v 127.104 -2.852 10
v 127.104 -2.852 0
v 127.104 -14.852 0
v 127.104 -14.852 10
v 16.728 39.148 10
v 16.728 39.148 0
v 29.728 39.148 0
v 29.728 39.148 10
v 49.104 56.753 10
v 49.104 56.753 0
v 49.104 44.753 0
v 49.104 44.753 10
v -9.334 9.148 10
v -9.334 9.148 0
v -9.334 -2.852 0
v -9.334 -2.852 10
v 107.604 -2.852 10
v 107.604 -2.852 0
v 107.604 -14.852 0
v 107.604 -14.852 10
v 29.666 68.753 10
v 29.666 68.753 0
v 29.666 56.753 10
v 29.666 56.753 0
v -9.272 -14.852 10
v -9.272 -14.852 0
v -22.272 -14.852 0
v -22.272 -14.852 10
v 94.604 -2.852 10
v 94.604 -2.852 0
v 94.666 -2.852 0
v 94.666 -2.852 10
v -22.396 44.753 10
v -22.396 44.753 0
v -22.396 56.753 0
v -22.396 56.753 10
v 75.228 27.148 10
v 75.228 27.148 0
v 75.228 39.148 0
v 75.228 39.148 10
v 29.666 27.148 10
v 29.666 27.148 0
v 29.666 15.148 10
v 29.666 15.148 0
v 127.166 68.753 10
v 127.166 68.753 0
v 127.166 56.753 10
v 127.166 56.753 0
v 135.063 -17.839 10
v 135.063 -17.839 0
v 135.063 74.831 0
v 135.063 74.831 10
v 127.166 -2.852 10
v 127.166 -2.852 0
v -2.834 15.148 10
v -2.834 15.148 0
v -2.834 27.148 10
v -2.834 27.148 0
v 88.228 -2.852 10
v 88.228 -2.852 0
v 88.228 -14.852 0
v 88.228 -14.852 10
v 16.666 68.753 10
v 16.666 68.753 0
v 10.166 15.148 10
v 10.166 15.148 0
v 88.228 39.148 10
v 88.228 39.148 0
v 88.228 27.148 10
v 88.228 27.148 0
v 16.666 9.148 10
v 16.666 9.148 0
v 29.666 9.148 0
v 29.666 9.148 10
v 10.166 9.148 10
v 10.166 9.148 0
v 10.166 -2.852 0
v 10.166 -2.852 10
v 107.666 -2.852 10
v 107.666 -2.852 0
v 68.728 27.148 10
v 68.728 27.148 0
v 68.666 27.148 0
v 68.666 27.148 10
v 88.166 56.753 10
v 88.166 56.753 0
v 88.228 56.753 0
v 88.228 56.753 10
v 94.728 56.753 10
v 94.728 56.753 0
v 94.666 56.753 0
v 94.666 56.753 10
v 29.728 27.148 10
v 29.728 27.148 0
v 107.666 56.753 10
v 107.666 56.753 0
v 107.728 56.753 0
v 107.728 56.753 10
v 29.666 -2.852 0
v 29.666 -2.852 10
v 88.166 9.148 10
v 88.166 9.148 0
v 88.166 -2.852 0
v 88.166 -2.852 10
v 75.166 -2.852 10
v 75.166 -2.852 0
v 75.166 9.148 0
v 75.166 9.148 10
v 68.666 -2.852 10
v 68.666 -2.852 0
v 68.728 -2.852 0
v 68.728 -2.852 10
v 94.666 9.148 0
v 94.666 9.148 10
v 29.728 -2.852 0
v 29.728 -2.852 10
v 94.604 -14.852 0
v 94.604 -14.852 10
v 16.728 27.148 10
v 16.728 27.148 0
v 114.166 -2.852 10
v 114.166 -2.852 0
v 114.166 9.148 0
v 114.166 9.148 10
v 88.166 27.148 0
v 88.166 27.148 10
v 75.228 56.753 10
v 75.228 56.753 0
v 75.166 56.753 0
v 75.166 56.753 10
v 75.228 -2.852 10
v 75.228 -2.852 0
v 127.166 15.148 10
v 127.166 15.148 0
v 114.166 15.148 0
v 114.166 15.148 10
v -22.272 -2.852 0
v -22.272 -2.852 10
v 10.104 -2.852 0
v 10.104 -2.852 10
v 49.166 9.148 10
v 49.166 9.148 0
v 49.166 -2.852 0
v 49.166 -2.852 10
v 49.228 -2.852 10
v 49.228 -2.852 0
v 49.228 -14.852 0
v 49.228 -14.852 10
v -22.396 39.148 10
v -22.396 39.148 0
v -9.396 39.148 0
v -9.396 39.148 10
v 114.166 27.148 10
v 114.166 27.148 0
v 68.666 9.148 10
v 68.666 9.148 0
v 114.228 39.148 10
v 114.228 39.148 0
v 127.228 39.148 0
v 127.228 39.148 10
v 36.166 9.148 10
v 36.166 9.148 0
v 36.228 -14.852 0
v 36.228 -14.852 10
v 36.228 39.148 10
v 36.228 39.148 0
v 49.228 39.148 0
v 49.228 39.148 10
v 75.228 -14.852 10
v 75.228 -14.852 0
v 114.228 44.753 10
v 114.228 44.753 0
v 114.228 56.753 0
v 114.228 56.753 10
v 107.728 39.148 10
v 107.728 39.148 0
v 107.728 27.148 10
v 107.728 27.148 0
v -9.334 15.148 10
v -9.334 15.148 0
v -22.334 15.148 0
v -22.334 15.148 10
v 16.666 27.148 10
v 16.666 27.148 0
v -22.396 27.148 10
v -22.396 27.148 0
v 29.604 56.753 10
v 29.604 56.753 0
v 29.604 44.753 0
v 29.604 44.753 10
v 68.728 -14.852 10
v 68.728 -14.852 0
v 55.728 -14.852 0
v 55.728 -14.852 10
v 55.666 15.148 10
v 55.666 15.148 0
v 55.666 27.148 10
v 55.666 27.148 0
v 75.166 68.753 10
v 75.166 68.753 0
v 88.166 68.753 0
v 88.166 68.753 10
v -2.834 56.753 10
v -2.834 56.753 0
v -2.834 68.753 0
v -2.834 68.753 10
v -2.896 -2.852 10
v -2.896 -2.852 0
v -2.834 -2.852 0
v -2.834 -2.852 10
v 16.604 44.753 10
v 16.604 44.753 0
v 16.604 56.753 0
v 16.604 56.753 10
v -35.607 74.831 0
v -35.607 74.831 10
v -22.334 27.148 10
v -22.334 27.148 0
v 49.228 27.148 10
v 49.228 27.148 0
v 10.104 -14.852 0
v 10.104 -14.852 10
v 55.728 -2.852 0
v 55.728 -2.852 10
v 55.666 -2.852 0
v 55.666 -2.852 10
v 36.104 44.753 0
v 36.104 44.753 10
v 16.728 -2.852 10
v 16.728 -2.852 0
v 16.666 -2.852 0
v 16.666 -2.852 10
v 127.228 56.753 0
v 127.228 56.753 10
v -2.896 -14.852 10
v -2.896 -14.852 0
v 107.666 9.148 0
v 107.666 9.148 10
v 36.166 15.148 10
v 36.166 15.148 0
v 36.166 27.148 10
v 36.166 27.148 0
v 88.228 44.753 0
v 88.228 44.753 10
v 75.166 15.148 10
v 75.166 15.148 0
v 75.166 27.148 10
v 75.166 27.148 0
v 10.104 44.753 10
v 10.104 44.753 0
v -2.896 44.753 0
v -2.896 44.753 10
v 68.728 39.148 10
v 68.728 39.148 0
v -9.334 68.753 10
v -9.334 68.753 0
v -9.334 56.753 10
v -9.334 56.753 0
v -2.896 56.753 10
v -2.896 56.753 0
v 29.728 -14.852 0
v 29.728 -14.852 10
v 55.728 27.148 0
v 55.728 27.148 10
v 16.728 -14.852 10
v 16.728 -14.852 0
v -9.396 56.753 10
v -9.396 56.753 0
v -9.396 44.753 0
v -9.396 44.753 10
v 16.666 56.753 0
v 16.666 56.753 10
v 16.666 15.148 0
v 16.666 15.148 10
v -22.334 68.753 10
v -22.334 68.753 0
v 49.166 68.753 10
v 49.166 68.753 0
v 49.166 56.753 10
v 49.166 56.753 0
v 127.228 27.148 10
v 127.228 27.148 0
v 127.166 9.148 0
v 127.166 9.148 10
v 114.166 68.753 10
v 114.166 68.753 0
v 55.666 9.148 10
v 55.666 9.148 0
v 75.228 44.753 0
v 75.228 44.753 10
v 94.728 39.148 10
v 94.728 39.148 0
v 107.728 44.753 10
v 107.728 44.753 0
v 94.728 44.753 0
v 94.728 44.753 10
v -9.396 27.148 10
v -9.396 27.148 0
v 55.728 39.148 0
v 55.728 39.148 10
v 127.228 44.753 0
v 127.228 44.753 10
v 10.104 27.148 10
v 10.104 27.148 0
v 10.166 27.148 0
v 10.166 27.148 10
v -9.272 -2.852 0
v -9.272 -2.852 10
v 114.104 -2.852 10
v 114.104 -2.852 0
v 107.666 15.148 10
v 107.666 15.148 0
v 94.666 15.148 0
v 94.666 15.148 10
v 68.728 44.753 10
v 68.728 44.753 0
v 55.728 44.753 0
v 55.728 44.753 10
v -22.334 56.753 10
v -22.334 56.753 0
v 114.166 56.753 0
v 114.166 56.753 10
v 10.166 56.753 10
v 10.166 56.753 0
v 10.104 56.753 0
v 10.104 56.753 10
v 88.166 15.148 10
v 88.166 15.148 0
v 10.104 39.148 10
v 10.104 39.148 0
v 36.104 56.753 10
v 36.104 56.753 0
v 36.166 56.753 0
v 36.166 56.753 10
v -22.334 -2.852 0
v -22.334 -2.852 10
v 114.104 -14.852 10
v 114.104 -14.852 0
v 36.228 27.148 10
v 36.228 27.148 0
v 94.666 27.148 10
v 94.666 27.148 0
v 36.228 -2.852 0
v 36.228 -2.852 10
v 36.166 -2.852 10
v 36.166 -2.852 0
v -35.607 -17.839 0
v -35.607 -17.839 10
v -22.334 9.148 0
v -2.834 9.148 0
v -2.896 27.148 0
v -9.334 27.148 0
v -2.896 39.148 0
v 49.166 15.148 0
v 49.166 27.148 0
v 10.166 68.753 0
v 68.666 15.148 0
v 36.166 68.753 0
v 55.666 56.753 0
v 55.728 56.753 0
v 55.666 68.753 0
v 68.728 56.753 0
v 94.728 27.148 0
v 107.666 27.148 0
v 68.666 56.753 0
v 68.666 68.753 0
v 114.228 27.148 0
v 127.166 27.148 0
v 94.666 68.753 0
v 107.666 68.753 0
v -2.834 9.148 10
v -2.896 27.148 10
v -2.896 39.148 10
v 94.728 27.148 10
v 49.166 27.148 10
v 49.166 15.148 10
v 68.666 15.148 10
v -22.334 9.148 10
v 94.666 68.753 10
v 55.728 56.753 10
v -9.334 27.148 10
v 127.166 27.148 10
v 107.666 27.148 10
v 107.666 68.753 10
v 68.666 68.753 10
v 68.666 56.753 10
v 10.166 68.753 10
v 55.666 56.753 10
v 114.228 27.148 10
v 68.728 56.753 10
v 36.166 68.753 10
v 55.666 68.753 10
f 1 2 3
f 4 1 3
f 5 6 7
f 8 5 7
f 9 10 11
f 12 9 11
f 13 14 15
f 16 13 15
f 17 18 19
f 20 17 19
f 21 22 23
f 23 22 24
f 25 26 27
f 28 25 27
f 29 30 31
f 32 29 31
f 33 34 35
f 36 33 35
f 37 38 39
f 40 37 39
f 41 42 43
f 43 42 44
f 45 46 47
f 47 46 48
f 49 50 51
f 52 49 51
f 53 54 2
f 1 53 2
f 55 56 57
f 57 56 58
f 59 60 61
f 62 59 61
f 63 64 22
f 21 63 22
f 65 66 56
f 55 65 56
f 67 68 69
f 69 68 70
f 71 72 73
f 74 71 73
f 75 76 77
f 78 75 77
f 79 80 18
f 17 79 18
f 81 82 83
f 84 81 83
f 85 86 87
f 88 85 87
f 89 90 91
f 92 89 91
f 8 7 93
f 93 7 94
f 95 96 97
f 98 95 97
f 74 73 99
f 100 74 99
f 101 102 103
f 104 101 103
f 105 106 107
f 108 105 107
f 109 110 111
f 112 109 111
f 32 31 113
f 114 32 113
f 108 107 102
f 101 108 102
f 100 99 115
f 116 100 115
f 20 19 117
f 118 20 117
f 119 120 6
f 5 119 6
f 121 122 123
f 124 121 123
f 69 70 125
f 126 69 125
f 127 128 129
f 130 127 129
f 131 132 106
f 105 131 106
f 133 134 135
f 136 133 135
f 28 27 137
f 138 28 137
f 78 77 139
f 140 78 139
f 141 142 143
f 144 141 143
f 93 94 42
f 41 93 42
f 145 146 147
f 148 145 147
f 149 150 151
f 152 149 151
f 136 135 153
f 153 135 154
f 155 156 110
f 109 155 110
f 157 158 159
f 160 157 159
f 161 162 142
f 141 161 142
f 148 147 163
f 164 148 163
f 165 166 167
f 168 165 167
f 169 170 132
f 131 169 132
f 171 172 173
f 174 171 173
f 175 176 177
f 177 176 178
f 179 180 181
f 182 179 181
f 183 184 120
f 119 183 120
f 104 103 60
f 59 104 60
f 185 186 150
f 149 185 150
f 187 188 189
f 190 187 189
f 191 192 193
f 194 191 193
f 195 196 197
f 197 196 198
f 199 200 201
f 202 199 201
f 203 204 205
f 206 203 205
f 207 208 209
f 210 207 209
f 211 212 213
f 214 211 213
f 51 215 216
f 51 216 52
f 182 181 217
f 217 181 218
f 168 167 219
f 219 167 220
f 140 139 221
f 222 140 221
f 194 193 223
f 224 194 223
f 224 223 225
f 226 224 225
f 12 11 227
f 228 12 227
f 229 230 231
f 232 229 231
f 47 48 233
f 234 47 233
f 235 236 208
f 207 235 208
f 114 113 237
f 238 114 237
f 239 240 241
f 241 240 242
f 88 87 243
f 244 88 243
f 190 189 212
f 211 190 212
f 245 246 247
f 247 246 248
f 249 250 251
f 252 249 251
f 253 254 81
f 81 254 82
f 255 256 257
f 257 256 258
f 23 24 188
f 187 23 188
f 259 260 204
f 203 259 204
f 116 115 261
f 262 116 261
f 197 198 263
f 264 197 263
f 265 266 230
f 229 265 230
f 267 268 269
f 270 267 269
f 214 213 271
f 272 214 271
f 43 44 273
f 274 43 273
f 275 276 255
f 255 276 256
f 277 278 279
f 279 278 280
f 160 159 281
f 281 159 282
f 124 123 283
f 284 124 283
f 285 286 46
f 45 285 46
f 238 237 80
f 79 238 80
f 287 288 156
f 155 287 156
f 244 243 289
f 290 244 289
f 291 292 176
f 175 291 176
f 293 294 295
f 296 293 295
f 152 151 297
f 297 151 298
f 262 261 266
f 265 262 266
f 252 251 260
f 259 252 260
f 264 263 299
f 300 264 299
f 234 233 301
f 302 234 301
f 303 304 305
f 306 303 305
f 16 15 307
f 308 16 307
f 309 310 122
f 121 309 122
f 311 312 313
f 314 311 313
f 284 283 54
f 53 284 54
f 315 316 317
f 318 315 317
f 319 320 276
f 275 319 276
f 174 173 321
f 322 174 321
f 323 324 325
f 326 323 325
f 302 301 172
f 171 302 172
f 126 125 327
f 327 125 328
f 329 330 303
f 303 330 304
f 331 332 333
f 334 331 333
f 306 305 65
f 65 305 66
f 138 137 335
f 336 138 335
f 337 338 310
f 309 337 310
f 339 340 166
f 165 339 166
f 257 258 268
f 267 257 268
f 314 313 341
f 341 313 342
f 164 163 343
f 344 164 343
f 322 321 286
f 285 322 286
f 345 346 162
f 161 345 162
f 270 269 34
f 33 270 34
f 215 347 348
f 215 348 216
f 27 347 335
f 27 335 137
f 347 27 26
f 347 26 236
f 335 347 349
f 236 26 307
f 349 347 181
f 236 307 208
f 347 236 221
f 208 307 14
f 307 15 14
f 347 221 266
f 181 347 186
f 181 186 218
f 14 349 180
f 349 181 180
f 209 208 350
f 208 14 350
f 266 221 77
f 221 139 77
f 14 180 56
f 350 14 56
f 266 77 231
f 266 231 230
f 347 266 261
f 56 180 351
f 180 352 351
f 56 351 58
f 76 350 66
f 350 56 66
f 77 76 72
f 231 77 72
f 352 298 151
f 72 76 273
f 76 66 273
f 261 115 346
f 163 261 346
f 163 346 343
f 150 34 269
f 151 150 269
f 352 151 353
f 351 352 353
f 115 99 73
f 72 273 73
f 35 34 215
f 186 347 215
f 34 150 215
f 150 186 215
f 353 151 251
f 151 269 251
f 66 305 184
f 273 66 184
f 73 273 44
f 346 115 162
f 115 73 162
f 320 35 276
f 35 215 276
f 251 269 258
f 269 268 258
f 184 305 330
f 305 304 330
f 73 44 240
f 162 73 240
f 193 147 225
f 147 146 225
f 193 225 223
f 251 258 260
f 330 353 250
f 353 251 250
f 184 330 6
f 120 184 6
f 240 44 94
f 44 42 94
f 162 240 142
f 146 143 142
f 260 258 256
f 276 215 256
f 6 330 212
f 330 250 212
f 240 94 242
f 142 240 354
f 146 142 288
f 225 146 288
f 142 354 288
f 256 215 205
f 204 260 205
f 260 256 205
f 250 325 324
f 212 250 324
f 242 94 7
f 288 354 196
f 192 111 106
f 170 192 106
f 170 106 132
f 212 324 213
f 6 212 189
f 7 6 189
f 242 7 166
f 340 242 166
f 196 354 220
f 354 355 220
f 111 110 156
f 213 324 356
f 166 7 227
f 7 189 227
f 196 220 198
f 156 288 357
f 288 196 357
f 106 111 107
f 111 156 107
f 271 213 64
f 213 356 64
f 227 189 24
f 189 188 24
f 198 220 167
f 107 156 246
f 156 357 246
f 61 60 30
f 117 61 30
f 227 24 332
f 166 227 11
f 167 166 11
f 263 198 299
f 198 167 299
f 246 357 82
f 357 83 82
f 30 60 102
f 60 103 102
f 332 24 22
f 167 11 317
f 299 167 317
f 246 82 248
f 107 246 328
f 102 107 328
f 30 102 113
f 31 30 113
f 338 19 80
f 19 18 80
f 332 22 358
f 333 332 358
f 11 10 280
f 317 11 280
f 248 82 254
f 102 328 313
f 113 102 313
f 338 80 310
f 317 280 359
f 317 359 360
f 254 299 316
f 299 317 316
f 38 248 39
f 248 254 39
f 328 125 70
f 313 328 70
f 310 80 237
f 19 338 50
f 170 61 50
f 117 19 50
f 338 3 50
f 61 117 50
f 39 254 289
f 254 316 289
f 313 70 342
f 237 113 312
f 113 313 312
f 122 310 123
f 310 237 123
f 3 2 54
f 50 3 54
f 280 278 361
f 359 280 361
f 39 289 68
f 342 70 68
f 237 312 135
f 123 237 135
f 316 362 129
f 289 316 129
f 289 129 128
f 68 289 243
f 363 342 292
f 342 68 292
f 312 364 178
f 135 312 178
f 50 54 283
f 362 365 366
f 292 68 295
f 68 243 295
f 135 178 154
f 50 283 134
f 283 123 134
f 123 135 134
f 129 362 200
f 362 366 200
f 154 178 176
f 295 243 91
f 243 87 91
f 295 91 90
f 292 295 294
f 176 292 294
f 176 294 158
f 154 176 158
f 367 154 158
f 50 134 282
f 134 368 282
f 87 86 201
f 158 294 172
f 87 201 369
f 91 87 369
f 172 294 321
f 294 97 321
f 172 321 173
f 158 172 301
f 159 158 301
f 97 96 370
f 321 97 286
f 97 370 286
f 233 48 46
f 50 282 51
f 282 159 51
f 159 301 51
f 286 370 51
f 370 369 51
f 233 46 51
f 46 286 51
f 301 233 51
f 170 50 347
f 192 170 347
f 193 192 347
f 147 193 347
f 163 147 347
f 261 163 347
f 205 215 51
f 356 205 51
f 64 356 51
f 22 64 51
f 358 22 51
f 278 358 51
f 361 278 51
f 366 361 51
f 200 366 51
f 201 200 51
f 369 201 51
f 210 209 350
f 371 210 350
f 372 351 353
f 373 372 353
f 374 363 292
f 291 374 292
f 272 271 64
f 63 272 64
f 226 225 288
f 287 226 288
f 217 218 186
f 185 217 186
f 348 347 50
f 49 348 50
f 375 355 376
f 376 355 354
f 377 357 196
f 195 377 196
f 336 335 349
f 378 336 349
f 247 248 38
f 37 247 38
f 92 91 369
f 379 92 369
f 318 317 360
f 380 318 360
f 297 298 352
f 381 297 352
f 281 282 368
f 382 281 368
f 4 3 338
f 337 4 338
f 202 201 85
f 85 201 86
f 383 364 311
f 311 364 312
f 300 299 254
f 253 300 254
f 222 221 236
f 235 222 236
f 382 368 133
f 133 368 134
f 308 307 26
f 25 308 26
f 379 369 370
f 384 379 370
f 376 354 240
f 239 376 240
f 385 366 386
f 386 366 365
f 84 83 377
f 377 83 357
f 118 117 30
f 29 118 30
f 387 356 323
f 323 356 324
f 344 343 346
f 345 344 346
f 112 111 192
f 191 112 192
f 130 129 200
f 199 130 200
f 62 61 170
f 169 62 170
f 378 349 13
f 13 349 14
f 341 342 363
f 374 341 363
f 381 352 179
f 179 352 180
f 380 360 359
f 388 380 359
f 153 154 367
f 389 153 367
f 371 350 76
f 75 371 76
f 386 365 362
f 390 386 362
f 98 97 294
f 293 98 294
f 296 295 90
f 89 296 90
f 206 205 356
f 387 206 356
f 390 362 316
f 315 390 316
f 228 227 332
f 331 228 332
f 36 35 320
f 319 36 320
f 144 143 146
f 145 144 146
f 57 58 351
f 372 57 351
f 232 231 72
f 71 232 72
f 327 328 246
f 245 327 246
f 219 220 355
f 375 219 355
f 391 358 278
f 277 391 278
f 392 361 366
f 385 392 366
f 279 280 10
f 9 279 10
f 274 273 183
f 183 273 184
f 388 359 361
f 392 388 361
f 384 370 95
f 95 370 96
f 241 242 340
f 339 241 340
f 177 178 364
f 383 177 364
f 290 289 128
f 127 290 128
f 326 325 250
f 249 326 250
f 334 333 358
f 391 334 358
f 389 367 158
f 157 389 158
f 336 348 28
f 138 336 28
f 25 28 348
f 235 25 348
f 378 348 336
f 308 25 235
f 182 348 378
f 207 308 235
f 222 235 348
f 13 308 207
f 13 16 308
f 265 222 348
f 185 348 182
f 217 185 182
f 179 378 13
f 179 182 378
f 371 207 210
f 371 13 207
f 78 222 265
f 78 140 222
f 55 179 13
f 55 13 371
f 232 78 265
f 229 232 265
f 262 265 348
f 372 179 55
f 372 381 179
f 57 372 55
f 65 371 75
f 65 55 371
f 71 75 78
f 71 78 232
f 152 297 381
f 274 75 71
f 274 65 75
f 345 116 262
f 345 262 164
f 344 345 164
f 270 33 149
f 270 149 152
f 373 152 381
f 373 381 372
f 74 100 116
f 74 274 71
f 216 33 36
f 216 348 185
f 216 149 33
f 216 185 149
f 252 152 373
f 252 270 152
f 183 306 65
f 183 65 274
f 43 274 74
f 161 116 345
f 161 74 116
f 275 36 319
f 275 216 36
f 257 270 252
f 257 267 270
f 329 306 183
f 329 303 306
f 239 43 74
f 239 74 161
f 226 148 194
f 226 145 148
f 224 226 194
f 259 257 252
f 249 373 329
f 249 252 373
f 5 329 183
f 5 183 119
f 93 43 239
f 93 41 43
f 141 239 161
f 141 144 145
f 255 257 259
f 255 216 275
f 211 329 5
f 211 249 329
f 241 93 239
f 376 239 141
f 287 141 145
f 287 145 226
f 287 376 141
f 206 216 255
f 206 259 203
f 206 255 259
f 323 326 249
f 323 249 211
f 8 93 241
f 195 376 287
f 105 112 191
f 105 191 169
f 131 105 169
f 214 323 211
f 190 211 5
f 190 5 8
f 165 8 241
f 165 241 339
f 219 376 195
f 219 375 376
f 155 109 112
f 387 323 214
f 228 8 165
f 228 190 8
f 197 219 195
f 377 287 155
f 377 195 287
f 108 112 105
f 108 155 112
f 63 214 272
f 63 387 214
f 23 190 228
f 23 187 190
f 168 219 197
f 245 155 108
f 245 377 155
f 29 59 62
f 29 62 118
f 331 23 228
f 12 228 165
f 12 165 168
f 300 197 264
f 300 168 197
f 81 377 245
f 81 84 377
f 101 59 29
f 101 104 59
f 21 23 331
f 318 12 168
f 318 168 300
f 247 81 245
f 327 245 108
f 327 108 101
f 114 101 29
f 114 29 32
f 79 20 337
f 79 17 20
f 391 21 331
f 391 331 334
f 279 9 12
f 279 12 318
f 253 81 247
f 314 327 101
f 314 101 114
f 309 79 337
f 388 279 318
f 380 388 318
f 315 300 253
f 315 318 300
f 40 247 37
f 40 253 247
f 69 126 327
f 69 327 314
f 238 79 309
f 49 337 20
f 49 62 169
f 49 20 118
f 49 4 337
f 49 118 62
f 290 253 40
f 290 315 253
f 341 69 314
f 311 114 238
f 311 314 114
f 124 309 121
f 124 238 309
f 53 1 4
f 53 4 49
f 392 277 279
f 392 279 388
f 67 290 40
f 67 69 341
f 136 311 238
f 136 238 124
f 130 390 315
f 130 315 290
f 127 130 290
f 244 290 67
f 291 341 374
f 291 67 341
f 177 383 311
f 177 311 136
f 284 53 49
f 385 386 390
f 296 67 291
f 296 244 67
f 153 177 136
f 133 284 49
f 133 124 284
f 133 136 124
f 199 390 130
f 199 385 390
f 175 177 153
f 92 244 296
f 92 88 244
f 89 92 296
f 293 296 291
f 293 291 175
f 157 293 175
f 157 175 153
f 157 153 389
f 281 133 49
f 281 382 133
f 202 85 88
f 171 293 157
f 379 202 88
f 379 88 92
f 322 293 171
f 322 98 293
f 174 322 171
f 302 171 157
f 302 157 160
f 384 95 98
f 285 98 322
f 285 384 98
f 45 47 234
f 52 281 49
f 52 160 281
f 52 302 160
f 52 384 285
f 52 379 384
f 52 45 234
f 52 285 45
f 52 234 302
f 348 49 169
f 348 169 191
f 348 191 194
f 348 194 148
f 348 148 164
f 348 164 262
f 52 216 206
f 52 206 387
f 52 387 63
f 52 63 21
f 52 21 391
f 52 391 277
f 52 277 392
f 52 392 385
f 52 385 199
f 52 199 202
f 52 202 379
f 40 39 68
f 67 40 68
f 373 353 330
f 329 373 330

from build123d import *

# Parameters (mm, degrees)
SKETCH1_W           = 170.67
SKETCH1_H           = 92.67
BOSS_EXTRUDE3_DEPTH = 10


with BuildPart() as part:
    # Sketch1 → Boss-Extrude3 (new body)
    with BuildSketch(Plane.XY):
        with Locations((49.728369838, 28.496112047)):
            Rectangle(SKETCH1_W, SKETCH1_H)
        Polygon((-22.271785995, -14.851567408), (-22.271785995, -2.851567408), (-22.334139111, -2.851567408), (-22.334139111, 9.148432592), (-9.334139111, 9.148432592), (-9.334139111, -2.851567408), (-9.271785995, -2.851567408), (-9.271785995, -14.851567408), align=None, mode=Mode.SUBTRACT)
        Polygon((-2.896492227, -14.851567408), (-2.896492227, -2.851567408), (-2.834139111, -2.851567408), (-2.834139111, 9.148432592), (10.165860889, 9.148432592), (10.165860889, -2.851567408), (10.103507773, -2.851567408), (10.103507773, -14.851567408), align=None, mode=Mode.SUBTRACT)
        Polygon((16.665860889, -2.851567408), (16.665860889, 9.148432592), (29.665860889, 9.148432592), (29.665860889, -2.851567408), (29.728214005, -2.851567408), (29.728214005, -14.851567408), (16.728214005, -14.851567408), (16.728214005, -2.851567408), align=None, mode=Mode.SUBTRACT)
        Polygon((36.165860889, -2.851567408), (36.165860889, 9.148432592), (49.165860889, 9.148432592), (49.165860889, -2.851567408), (49.228214005, -2.851567408), (49.228214005, -14.851567408), (36.228214005, -14.851567408), (36.228214005, -2.851567408), align=None, mode=Mode.SUBTRACT)
        Polygon((-9.334139111, 27.148432592), (-9.334139111, 15.148432592), (-22.334139111, 15.148432592), (-22.334139111, 27.148432592), (-22.396492227, 27.148432592), (-22.396492227, 39.148432592), (-9.396492227, 39.148432592), (-9.396492227, 27.148432592), align=None, mode=Mode.SUBTRACT)
        Polygon((10.165860889, 27.148432592), (10.165860889, 15.148432592), (-2.834139111, 15.148432592), (-2.834139111, 27.148432592), (-2.896492227, 27.148432592), (-2.896492227, 39.148432592), (10.103507773, 39.148432592), (10.103507773, 27.148432592), align=None, mode=Mode.SUBTRACT)
        Polygon((29.728214005, 39.148432592), (29.728214005, 27.148432592), (29.665860889, 27.148432592), (29.665860889, 15.148432592), (16.665860889, 15.148432592), (16.665860889, 27.148432592), (16.728214005, 27.148432592), (16.728214005, 39.148432592), align=None, mode=Mode.SUBTRACT)
        Polygon((49.228214005, 39.148432592), (49.228214005, 27.148432592), (49.165860889, 27.148432592), (49.165860889, 15.148432592), (36.165860889, 15.148432592), (36.165860889, 27.148432592), (36.228214005, 27.148432592), (36.228214005, 39.148432592), align=None, mode=Mode.SUBTRACT)
        Polygon((55.665860889, 9.148432592), (68.665860889, 9.148432592), (68.665860889, -2.851567408), (68.728214005, -2.851567408), (68.728214005, -14.851567408), (55.728214005, -14.851567408), (55.728214005, -2.851567408), (55.665860889, -2.851567408), align=None, mode=Mode.SUBTRACT)
        Polygon((75.165860889, 9.148432592), (88.165860889, 9.148432592), (88.165860889, -2.851567408), (88.228214005, -2.851567408), (88.228214005, -14.851567408), (75.228214005, -14.851567408), (75.228214005, -2.851567408), (75.165860889, -2.851567408), align=None, mode=Mode.SUBTRACT)
        Polygon((94.603507773, -14.851567408), (94.603507773, -2.851567408), (94.665860889, -2.851567408), (94.665860889, 9.148432592), (107.665860889, 9.148432592), (107.665860889, -2.851567408), (107.603507773, -2.851567408), (107.603507773, -14.851567408), align=None, mode=Mode.SUBTRACT)
        Polygon((127.165860889, -2.851567408), (127.103507773, -2.851567408), (127.103507773, -14.851567408), (114.103507773, -14.851567408), (114.103507773, -2.851567408), (114.165860889, -2.851567408), (114.165860889, 9.148432592), (127.165860889, 9.148432592), align=None, mode=Mode.SUBTRACT)
        Polygon((68.728214005, 39.148432592), (68.728214005, 27.148432592), (68.665860889, 27.148432592), (68.665860889, 15.148432592), (55.665860889, 15.148432592), (55.665860889, 27.148432592), (55.728214005, 27.148432592), (55.728214005, 39.148432592), align=None, mode=Mode.SUBTRACT)
        Polygon((88.228214005, 39.148432592), (88.228214005, 27.148432592), (88.165860889, 27.148432592), (88.165860889, 15.148432592), (75.165860889, 15.148432592), (75.165860889, 27.148432592), (75.228214005, 27.148432592), (75.228214005, 39.148432592), align=None, mode=Mode.SUBTRACT)
        Polygon((94.665860889, 27.148432592), (94.728214005, 27.148432592), (94.728214005, 39.148432592), (107.728214005, 39.148432592), (107.728214005, 27.148432592), (107.665860889, 27.148432592), (107.665860889, 15.148432592), (94.665860889, 15.148432592), align=None, mode=Mode.SUBTRACT)
        Polygon((127.228214005, 39.148432592), (127.228214005, 27.148432592), (127.165860889, 27.148432592), (127.165860889, 15.148432592), (114.165860889, 15.148432592), (114.165860889, 27.148432592), (114.228214005, 27.148432592), (114.228214005, 39.148432592), align=None, mode=Mode.SUBTRACT)
        Polygon((-22.396492227, 44.753067208), (-22.396492227, 56.753067208), (-22.334139111, 56.753067208), (-22.334139111, 68.753067208), (-9.334139111, 68.753067208), (-9.334139111, 56.753067208), (-9.396492227, 56.753067208), (-9.396492227, 44.753067208), align=None, mode=Mode.SUBTRACT)
        Polygon((10.165860889, 56.753067208), (10.103507773, 56.753067208), (10.103507773, 44.753067208), (-2.896492227, 44.753067208), (-2.896492227, 56.753067208), (-2.834139111, 56.753067208), (-2.834139111, 68.753067208), (10.165860889, 68.753067208), align=None, mode=Mode.SUBTRACT)
        Polygon((16.603507773, 44.753067208), (16.603507773, 56.753067208), (16.665860889, 56.753067208), (16.665860889, 68.753067208), (29.665860889, 68.753067208), (29.665860889, 56.753067208), (29.603507773, 56.753067208), (29.603507773, 44.753067208), align=None, mode=Mode.SUBTRACT)
        Polygon((36.103507773, 44.753067208), (36.103507773, 56.753067208), (36.165860889, 56.753067208), (36.165860889, 68.753067208), (49.165860889, 68.753067208), (49.165860889, 56.753067208), (49.103507773, 56.753067208), (49.103507773, 44.753067208), align=None, mode=Mode.SUBTRACT)
        Polygon((55.665860889, 68.753067208), (68.665860889, 68.753067208), (68.665860889, 56.753067208), (68.728214005, 56.753067208), (68.728214005, 44.753067208), (55.728214005, 44.753067208), (55.728214005, 56.753067208), (55.665860889, 56.753067208), align=None, mode=Mode.SUBTRACT)
        Polygon((75.165860889, 68.753067208), (88.165860889, 68.753067208), (88.165860889, 56.753067208), (88.228214005, 56.753067208), (88.228214005, 44.753067208), (75.228214005, 44.753067208), (75.228214005, 56.753067208), (75.165860889, 56.753067208), align=None, mode=Mode.SUBTRACT)
        Polygon((94.665860889, 68.753067208), (107.665860889, 68.753067208), (107.665860889, 56.753067208), (107.728214005, 56.753067208), (107.728214005, 44.753067208), (94.728214005, 44.753067208), (94.728214005, 56.753067208), (94.665860889, 56.753067208), align=None, mode=Mode.SUBTRACT)
        Polygon((114.165860889, 56.753067208), (114.165860889, 68.753067208), (127.165860889, 68.753067208), (127.165860889, 56.753067208), (127.228214005, 56.753067208), (127.228214005, 44.753067208), (114.228214005, 44.753067208), (114.228214005, 56.753067208), align=None, mode=Mode.SUBTRACT)
    extrude(amount=BOSS_EXTRUDE3_DEPTH)


solid = part.part
